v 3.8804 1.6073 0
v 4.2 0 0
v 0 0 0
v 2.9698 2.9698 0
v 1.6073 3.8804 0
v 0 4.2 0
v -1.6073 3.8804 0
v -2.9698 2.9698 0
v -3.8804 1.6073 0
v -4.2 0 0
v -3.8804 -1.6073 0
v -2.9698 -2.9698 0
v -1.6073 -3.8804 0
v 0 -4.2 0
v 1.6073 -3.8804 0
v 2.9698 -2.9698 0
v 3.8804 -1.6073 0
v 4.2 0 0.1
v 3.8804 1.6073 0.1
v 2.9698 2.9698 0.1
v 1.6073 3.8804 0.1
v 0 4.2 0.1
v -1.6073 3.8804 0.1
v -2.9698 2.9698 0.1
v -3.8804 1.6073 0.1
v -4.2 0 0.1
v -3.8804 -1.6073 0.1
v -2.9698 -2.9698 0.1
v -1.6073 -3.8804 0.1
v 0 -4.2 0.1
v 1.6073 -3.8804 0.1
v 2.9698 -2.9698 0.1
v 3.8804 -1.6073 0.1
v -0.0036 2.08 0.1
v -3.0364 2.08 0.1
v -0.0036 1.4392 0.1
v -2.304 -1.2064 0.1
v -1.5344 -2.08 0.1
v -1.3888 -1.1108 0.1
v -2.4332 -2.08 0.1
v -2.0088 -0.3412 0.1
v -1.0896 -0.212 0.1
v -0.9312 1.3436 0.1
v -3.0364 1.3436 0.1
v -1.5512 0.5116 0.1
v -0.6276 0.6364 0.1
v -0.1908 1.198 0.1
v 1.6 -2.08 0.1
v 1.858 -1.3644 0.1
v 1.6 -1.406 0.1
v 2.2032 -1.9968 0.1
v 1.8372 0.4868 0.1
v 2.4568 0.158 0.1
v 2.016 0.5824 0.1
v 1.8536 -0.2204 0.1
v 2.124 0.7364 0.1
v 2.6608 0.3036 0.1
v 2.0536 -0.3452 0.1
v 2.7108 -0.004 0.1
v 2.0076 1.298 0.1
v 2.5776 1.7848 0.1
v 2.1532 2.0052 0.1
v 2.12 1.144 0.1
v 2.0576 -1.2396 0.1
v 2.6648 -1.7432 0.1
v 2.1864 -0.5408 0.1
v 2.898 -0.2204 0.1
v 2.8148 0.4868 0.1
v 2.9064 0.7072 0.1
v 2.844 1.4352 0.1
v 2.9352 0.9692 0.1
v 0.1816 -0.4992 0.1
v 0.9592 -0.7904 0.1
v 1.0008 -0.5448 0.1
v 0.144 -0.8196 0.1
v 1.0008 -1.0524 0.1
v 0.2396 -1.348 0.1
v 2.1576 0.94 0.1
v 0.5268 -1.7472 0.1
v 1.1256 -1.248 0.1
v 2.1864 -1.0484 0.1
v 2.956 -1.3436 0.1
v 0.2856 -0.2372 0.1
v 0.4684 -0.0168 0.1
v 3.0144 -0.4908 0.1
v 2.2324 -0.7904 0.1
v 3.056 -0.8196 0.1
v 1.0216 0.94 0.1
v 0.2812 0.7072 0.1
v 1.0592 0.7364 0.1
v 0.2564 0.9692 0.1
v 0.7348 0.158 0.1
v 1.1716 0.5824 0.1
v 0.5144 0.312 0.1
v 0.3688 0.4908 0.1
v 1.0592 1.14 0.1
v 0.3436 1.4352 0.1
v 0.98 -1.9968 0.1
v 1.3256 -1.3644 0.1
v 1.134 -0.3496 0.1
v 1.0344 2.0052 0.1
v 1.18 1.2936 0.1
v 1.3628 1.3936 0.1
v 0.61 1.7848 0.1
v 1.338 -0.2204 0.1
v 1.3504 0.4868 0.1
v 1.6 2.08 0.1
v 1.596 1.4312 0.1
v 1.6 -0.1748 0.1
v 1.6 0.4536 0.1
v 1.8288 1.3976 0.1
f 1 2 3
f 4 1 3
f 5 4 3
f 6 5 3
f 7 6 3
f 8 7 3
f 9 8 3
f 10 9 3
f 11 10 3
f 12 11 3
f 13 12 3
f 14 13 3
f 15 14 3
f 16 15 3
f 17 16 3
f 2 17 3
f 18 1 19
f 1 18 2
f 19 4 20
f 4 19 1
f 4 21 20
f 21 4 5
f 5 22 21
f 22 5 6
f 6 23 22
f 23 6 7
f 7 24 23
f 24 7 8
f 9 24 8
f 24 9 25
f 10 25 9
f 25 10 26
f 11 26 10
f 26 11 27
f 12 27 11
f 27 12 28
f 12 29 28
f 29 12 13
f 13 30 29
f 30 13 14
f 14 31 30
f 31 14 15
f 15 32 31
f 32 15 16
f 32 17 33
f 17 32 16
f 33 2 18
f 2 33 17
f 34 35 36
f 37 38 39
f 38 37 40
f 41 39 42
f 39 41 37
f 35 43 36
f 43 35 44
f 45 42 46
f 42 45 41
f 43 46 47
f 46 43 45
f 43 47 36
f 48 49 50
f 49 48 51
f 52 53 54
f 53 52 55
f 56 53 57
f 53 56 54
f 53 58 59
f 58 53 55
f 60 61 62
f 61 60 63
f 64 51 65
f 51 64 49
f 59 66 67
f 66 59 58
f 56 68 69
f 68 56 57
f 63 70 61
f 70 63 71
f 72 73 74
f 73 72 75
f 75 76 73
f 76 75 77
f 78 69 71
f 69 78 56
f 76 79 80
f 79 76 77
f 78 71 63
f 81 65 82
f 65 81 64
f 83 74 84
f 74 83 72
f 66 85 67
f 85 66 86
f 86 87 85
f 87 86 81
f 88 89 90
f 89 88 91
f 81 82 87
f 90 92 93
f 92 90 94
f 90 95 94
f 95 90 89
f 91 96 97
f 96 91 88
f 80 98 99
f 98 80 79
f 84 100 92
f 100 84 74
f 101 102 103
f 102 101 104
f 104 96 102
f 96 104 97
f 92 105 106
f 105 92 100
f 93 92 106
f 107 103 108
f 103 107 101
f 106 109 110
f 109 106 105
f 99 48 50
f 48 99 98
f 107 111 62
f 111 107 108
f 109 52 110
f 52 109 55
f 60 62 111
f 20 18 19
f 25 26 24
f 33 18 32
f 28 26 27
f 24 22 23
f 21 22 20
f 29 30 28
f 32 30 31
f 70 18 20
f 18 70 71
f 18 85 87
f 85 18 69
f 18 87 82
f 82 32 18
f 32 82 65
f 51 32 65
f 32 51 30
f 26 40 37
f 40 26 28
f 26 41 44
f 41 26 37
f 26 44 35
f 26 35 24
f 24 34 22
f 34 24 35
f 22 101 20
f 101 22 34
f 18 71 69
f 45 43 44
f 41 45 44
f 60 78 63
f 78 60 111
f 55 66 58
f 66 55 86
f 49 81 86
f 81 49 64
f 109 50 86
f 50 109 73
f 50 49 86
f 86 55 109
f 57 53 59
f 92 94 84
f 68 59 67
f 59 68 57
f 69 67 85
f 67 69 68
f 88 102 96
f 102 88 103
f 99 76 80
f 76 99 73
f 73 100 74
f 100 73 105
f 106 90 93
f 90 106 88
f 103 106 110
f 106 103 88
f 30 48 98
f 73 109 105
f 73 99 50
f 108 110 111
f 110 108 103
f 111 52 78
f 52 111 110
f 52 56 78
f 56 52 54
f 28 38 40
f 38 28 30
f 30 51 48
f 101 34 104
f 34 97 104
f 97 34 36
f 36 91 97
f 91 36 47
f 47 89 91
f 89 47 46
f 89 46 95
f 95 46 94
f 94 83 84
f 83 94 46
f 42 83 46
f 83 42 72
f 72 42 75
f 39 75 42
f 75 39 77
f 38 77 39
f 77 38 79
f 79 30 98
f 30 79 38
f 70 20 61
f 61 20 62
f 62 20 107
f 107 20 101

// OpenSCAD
// file: ../p/4-4disc.scad
use <../lib.scad>
function ldraw_lib__4_4disc() = [
// 0 Disc 1.0
// 0 Name: 4-4disc.dat
// 0 Author: James Jessiman
// 0 !LDRAW_ORG Primitive UPDATE 2002-02
// 0 !LICENSE Licensed under CC BY 4.0 : see CAreadme.txt
// 
// 0 BFC CERTIFY CCW
  [0,"BFC","CERTIFY"],
  [0,"BFC","CCW"],
// 
// 0 !HISTORY 1998-12-15 [PTadmin] Official Update 1998-10
// 0 !HISTORY 2002-03-23 [sbliss] Added BFC statement
// 0 !HISTORY 2002-04-25 [PTadmin] Official Update 2002-02
// 0 !HISTORY 2007-06-24 [PTadmin] Header formatted for Contributor Agreement
// 0 !HISTORY 2008-07-01 [PTadmin] Official Update 2008-01
// 
// 
// 3 16 0 0 0 1 0 0 0.9239 0 0.3827
  [3,16,0,0,0,1,0,0,0.9239,0,0.3827],
// 3 16 0 0 0 0.9239 0 0.3827 0.7071 0 0.7071
  [3,16,0,0,0,0.9239,0,0.3827,0.7071,0,0.7071],
// 3 16 0 0 0 0.7071 0 0.7071 0.3827 0 0.9239
  [3,16,0,0,0,0.7071,0,0.7071,0.3827,0,0.9239],
// 3 16 0 0 0 0.3827 0 0.9239 0 0 1
  [3,16,0,0,0,0.3827,0,0.9239,0,0,1],
// 3 16 0 0 0 0 0 1 -0.3827 0 0.9239
  [3,16,0,0,0,0,0,1,-0.3827,0,0.9239],
// 3 16 0 0 0 -0.3827 0 0.9239 -0.7071 0 0.7071
  [3,16,0,0,0,-0.3827,0,0.9239,-0.7071,0,0.7071],
// 3 16 0 0 0 -0.7071 0 0.7071 -0.9239 0 0.3827
  [3,16,0,0,0,-0.7071,0,0.7071,-0.9239,0,0.3827],
// 3 16 0 0 0 -0.9239 0 0.3827 -1 0 -0
  [3,16,0,0,0,-0.9239,0,0.3827,-1,0,-0],
// 3 16 0 0 0 -1 0 -0 -0.9239 0 -0.3827
  [3,16,0,0,0,-1,0,-0,-0.9239,0,-0.3827],
// 3 16 0 0 0 -0.9239 0 -0.3827 -0.7071 0 -0.7071
  [3,16,0,0,0,-0.9239,0,-0.3827,-0.7071,0,-0.7071],
// 3 16 0 0 0 -0.7071 0 -0.7071 -0.3827 0 -0.9239
  [3,16,0,0,0,-0.7071,0,-0.7071,-0.3827,0,-0.9239],
// 3 16 0 0 0 -0.3827 0 -0.9239 0 0 -1
  [3,16,0,0,0,-0.3827,0,-0.9239,0,0,-1],
// 3 16 0 0 0 0 0 -1 0.3827 0 -0.9239
  [3,16,0,0,0,0,0,-1,0.3827,0,-0.9239],
// 3 16 0 0 0 0.3827 0 -0.9239 0.7071 0 -0.7071
  [3,16,0,0,0,0.3827,0,-0.9239,0.7071,0,-0.7071],
// 3 16 0 0 0 0.7071 0 -0.7071 0.9239 0 -0.3827
  [3,16,0,0,0,0.7071,0,-0.7071,0.9239,0,-0.3827],
// 3 16 0 0 0 0.9239 0 -0.3827 1 0 0
  [3,16,0,0,0,0.9239,0,-0.3827,1,0,0],
// 0
];
module ldraw_lib__4_4disc(step=0, col=false, unit=2/5, alt=false, line=0.2, solid=!$preview)
    makepoly(ldraw_lib__4_4disc(), step=step, col=col, unit=unit, alt=alt, line=line, solid=solid);
ldraw_lib__4_4disc(line=0.2);
// file: ../p/4-4cyli.scad
use <../lib.scad>
function ldraw_lib__4_4cyli() = [
// 0 Cylinder 1.0
// 0 Name: 4-4cyli.dat
// 0 Author: James Jessiman
// 0 !LDRAW_ORG Primitive UPDATE 2005-01
// 0 !LICENSE Licensed under CC BY 4.0 : see CAreadme.txt
// 
// 0 BFC CERTIFY CCW
  [0,"BFC","CERTIFY"],
  [0,"BFC","CCW"],
// 
// 0 !HISTORY 1998-12-15 [PTadmin] Official Update 1998-10
// 0 !HISTORY 2002-03-23 [sbliss] Added BFC statement; merged headers from files in distributions LDraw 0.27 and Complete.
// 0 !HISTORY 2002-04-25 [PTadmin] Official Update 2002-02
// 0 !HISTORY 2004-12-14 [guyvivan] BFC CCW
// 0 !HISTORY 2005-12-28 [PTadmin] Official Update 2005-01
// 0 !HISTORY 2007-06-24 [PTadmin] Header formatted for Contributor Agreement
// 0 !HISTORY 2008-07-01 [PTadmin] Official Update 2008-01
// 
// 
// 4 16 1 1 0 0.9239 1 0.3827 0.9239 0 0.3827 1 0 0
  [4,16,1,1,0,0.9239,1,0.3827,0.9239,0,0.3827,1,0,0],
// 5 24 1 0 0 1 1 0 0.9239 0 0.3827 0.9239 0 -0.3827
  [5,24,1,0,0,1,1,0,0.9239,0,0.3827,0.9239,0,-0.3827],
// 4 16 0.9239 1 0.3827 0.7071 1 0.7071 0.7071 0 0.7071 0.9239 0 0.3827
  [4,16,0.9239,1,0.3827,0.7071,1,0.7071,0.7071,0,0.7071,0.9239,0,0.3827],
// 5 24 0.9239 0 0.3827 0.9239 1 0.3827 0.7071 0 0.7071 1 0 0
  [5,24,0.9239,0,0.3827,0.9239,1,0.3827,0.7071,0,0.7071,1,0,0],
// 4 16 0.7071 1 0.7071 0.3827 1 0.9239 0.3827 0 0.9239 0.7071 0 0.7071
  [4,16,0.7071,1,0.7071,0.3827,1,0.9239,0.3827,0,0.9239,0.7071,0,0.7071],
// 5 24 0.7071 0 0.7071 0.7071 1 0.7071 0.3827 0 0.9239 0.9239 0 0.3827
  [5,24,0.7071,0,0.7071,0.7071,1,0.7071,0.3827,0,0.9239,0.9239,0,0.3827],
// 4 16 0.3827 1 0.9239 0 1 1 0 0 1 0.3827 0 0.9239
  [4,16,0.3827,1,0.9239,0,1,1,0,0,1,0.3827,0,0.9239],
// 5 24 0.3827 0 0.9239 0.3827 1 0.9239 0 0 1 0.7071 0 0.7071
  [5,24,0.3827,0,0.9239,0.3827,1,0.9239,0,0,1,0.7071,0,0.7071],
// 4 16 0 1 1 -0.3827 1 0.9239 -0.3827 0 0.9239 0 0 1
  [4,16,0,1,1,-0.3827,1,0.9239,-0.3827,0,0.9239,0,0,1],
// 5 24 0 0 1 0 1 1 -0.3827 0 0.9239 0.3827 0 0.9239
  [5,24,0,0,1,0,1,1,-0.3827,0,0.9239,0.3827,0,0.9239],
// 4 16 -0.3827 1 0.9239 -0.7071 1 0.7071 -0.7071 0 0.7071 -0.3827 0 0.9239
  [4,16,-0.3827,1,0.9239,-0.7071,1,0.7071,-0.7071,0,0.7071,-0.3827,0,0.9239],
// 5 24 -0.3827 0 0.9239 -0.3827 1 0.9239 -0.7071 0 0.7071 0 0 1
  [5,24,-0.3827,0,0.9239,-0.3827,1,0.9239,-0.7071,0,0.7071,0,0,1],
// 4 16 -0.7071 1 0.7071 -0.9239 1 0.3827 -0.9239 0 0.3827 -0.7071 0 0.7071
  [4,16,-0.7071,1,0.7071,-0.9239,1,0.3827,-0.9239,0,0.3827,-0.7071,0,0.7071],
// 5 24 -0.7071 0 0.7071 -0.7071 1 0.7071 -0.9239 0 0.3827 -0.3827 0 0.9239
  [5,24,-0.7071,0,0.7071,-0.7071,1,0.7071,-0.9239,0,0.3827,-0.3827,0,0.9239],
// 4 16 -0.9239 1 0.3827 -1 1 0 -1 0 0 -0.9239 0 0.3827
  [4,16,-0.9239,1,0.3827,-1,1,0,-1,0,0,-0.9239,0,0.3827],
// 5 24 -0.9239 0 0.3827 -0.9239 1 0.3827 -1 0 0 -0.7071 0 0.7071
  [5,24,-0.9239,0,0.3827,-0.9239,1,0.3827,-1,0,0,-0.7071,0,0.7071],
// 4 16 -1 1 0 -0.9239 1 -0.3827 -0.9239 0 -0.3827 -1 0 0
  [4,16,-1,1,0,-0.9239,1,-0.3827,-0.9239,0,-0.3827,-1,0,0],
// 5 24 -1 0 0 -1 1 0 -0.9239 0 -0.3827 -0.9239 0 0.3827
  [5,24,-1,0,0,-1,1,0,-0.9239,0,-0.3827,-0.9239,0,0.3827],
// 4 16 -0.9239 1 -0.3827 -0.7071 1 -0.7071 -0.7071 0 -0.7071 -0.9239 0 -0.3827
  [4,16,-0.9239,1,-0.3827,-0.7071,1,-0.7071,-0.7071,0,-0.7071,-0.9239,0,-0.3827],
// 5 24 -0.9239 0 -0.3827 -0.9239 1 -0.3827 -0.7071 0 -0.7071 -1 0 0
  [5,24,-0.9239,0,-0.3827,-0.9239,1,-0.3827,-0.7071,0,-0.7071,-1,0,0],
// 4 16 -0.7071 1 -0.7071 -0.3827 1 -0.9239 -0.3827 0 -0.9239 -0.7071 0 -0.7071
  [4,16,-0.7071,1,-0.7071,-0.3827,1,-0.9239,-0.3827,0,-0.9239,-0.7071,0,-0.7071],
// 5 24 -0.7071 0 -0.7071 -0.7071 1 -0.7071 -0.3827 0 -0.9239 -0.9239 0 -0.3827
  [5,24,-0.7071,0,-0.7071,-0.7071,1,-0.7071,-0.3827,0,-0.9239,-0.9239,0,-0.3827],
// 4 16 -0.3827 1 -0.9239 0 1 -1 0 0 -1 -0.3827 0 -0.9239
  [4,16,-0.3827,1,-0.9239,0,1,-1,0,0,-1,-0.3827,0,-0.9239],
// 5 24 -0.3827 0 -0.9239 -0.3827 1 -0.9239 0 0 -1 -0.7071 0 -0.7071
  [5,24,-0.3827,0,-0.9239,-0.3827,1,-0.9239,0,0,-1,-0.7071,0,-0.7071],
// 4 16 0 1 -1 0.3827 1 -0.9239 0.3827 0 -0.9239 0 0 -1
  [4,16,0,1,-1,0.3827,1,-0.9239,0.3827,0,-0.9239,0,0,-1],
// 5 24 0 0 -1 0 1 -1 0.3827 0 -0.9239 -0.3827 0 -0.9239
  [5,24,0,0,-1,0,1,-1,0.3827,0,-0.9239,-0.3827,0,-0.9239],
// 4 16 0.3827 1 -0.9239 0.7071 1 -0.7071 0.7071 0 -0.7071 0.3827 0 -0.9239
  [4,16,0.3827,1,-0.9239,0.7071,1,-0.7071,0.7071,0,-0.7071,0.3827,0,-0.9239],
// 5 24 0.3827 0 -0.9239 0.3827 1 -0.9239 0.7071 0 -0.7071 0 0 -1
  [5,24,0.3827,0,-0.9239,0.3827,1,-0.9239,0.7071,0,-0.7071,0,0,-1],
// 4 16 0.7071 1 -0.7071 0.9239 1 -0.3827 0.9239 0 -0.3827 0.7071 0 -0.7071
  [4,16,0.7071,1,-0.7071,0.9239,1,-0.3827,0.9239,0,-0.3827,0.7071,0,-0.7071],
// 5 24 0.7071 0 -0.7071 0.7071 1 -0.7071 0.9239 0 -0.3827 0.3827 0 -0.9239
  [5,24,0.7071,0,-0.7071,0.7071,1,-0.7071,0.9239,0,-0.3827,0.3827,0,-0.9239],
// 4 16 0.9239 1 -0.3827 1 1 0 1 0 0 0.9239 0 -0.3827
  [4,16,0.9239,1,-0.3827,1,1,0,1,0,0,0.9239,0,-0.3827],
// 5 24 0.9239 0 -0.3827 0.9239 1 -0.3827 1 0 0 0.7071 0 -0.7071
  [5,24,0.9239,0,-0.3827,0.9239,1,-0.3827,1,0,0,0.7071,0,-0.7071],
// 0
];
module ldraw_lib__4_4cyli(step=0, col=false, unit=2/5, alt=false, line=0.2, solid=!$preview)
    makepoly(ldraw_lib__4_4cyli(), step=step, col=col, unit=unit, alt=alt, line=line, solid=solid);
ldraw_lib__4_4cyli(line=0.2);
// file: ../p/4-4cylc3.scad
use <../lib.scad>
use <4-4cyli.scad>
use <4-4disc.scad>
function ldraw_lib__4_4cylc3() = [
// 0 Cylinder Closed 1.0 without Top or Bottom Edge Lines
// 0 Name: 4-4cylc3.dat
// 0 Author: Chris Dee [cwdee]
// 0 !LDRAW_ORG Primitive UPDATE 2017-01
// 0 !LICENSE Licensed under CC BY 4.0 : see CAreadme.txt
// 
// 0 BFC CERTIFY CCW
  [0,"BFC","CERTIFY"],
  [0,"BFC","CCW"],
// 
// 0 !HISTORY 2017-12-30 [PTadmin] Official Update 2017-01
// 
// 
// 1 16 0 0 0 1 0 0 0 1 0 0 0 1 4-4disc.dat
  [1,16,0,0,0,1,0,0,0,1,0,0,0,1, ldraw_lib__4_4disc()],
// 1 16 0 0 0 1 0 0 0 1 0 0 0 1 4-4cyli.dat
  [1,16,0,0,0,1,0,0,0,1,0,0,0,1, ldraw_lib__4_4cyli()],
// 0
];
module ldraw_lib__4_4cylc3(step=0, col=false, unit=2/5, alt=false, line=0.2, solid=!$preview)
    makepoly(ldraw_lib__4_4cylc3(), step=step, col=col, unit=unit, alt=alt, line=line, solid=solid);
ldraw_lib__4_4cylc3(line=0.2);
// file: ../p/1-8chrd.scad
use <../lib.scad>
function ldraw_lib__1_8chrd() = [
// 0 Chord 0.125
// 0 Name: 1-8chrd.dat
// 0 Author: Orion Pobursky [OrionP]
// 0 !LDRAW_ORG Primitive UPDATE 2023-05
// 0 !LICENSE Licensed under CC BY 4.0 : see CAreadme.txt
// 
// 0 BFC CERTIFY CCW
  [0,"BFC","CERTIFY"],
  [0,"BFC","CCW"],
// 
// 0 !HISTORY 2004-04-22 [PTadmin] Official Update 2004-02
// 0 !HISTORY 2007-06-22 [PTadmin] Header formatted for Contributor Agreement
// 0 !HISTORY 2008-07-01 [PTadmin] Official Update 2008-01
// 0 !HISTORY 2023-10-27 [OrionP] Rebuilt with PrimGen2, original author westrate
// 0 !HISTORY 2023-10-31 [OrionP] Official Update 2023-05
// 
// 3 16 1 0 0 0.9239 0 0.3827 0.7071 0 0.7071
  [3,16,1,0,0,0.9239,0,0.3827,0.7071,0,0.7071],
];
module ldraw_lib__1_8chrd(step=0, col=false, unit=2/5, alt=false, line=0.2, solid=!$preview)
    makepoly(ldraw_lib__1_8chrd(), step=step, col=col, unit=unit, alt=alt, line=line, solid=solid);
ldraw_lib__1_8chrd(line=0.2);
// main file
use <../lib.scad>
use <../p/1-8chrd.scad>
use <../p/4-4cylc3.scad>
function ldraw_lib__003667d() = [
// 0 Sticker  1.0 x  1.0 Round with White "78" on Black Background
// 0 Name: 003667d.dat
// 0 Author: Willy Tschager [Holly-Wood]
// 0 !LDRAW_ORG Part UPDATE 2024-01
// 0 !LICENSE Licensed under CC BY 4.0 : see CAreadme.txt
// 
// 0 BFC CERTIFY CCW
  [0,"BFC","CERTIFY"],
  [0,"BFC","CCW"],
// 
// 0 !KEYWORDS Bricklink 619stk01, Brickowl 853878, Car, legoland, Race
// 0 !KEYWORDS Rebrickable 3667, set 619, town
// 
// 0 !HISTORY 2024-01-29 [OrionP] Official Update 2024-01
// 
// 0 // Small cylinder
// 1 16 0 0 0 10.5 0 0 0 -.25 0 0 0 10.5 4-4cylc3.dat
  [1,16,0,0,0,10.5,0,0,0,-.25,0,0,0,10.5, ldraw_lib__4_4cylc3()],
// 
// 0 // 7
// 0 // White
// 3 15 -.009 -.25 5.2 -7.591 -.25 5.2 -.009 -.25 3.598
  [3,15,-.009,-.25,5.2,-7.591,-.25,5.2,-.009,-.25,3.598],
// 4 15 -6.083 -.25 -5.2 -3.836 -.25 -5.2 -3.472 -.25 -2.777 -5.76 -.25 -3.016
  [4,15,-6.083,-.25,-5.2,-3.836,-.25,-5.2,-3.472,-.25,-2.777,-5.76,-.25,-3.016],
// 4 15 -2.724 -.25 -.53 -5.022 -.25 -.853 -5.76 -.25 -3.016 -3.472 -.25 -2.777
  [4,15,-2.724,-.25,-.53,-5.022,-.25,-.853,-5.76,-.25,-3.016,-3.472,-.25,-2.777],
// 4 15 -.009 -.25 3.598 -7.591 -.25 5.2 -7.591 -.25 3.359 -2.328 -.25 3.359
  [4,15,-.009,-.25,3.598,-7.591,-.25,5.2,-7.591,-.25,3.359,-2.328,-.25,3.359],
// 4 15 -5.022 -.25 -.853 -2.724 -.25 -.53 -1.569 -.25 1.591 -3.878 -.25 1.279
  [4,15,-5.022,-.25,-.853,-2.724,-.25,-.53,-1.569,-.25,1.591,-3.878,-.25,1.279],
// 4 15 -.477 -.25 2.995 -2.328 -.25 3.359 -3.878 -.25 1.279 -1.569 -.25 1.591
  [4,15,-.477,-.25,2.995,-2.328,-.25,3.359,-3.878,-.25,1.279,-1.569,-.25,1.591],
// 3 15 -2.328 -.25 3.359 -.477 -.25 2.995 -.009 -.25 3.598
  [3,15,-2.328,-.25,3.359,-.477,-.25,2.995,-.009,-.25,3.598],
// 
// 0 // 8
// 0 // White
// 4 15 4 -.25 -3.515 4 -.25 -5.2 5.508 -.25 -4.992 4.645 -.25 -3.411
  [4,15,4,-.25,-3.515,4,-.25,-5.2,5.508,-.25,-4.992,4.645,-.25,-3.411],
// 4 15 5.04 -.25 1.456 4.593 -.25 1.217 4.634 -.25 -.551 6.142 -.25 .395
  [4,15,5.04,-.25,1.456,4.593,-.25,1.217,4.634,-.25,-.551,6.142,-.25,.395],
// 4 15 6.652 -.25 .759 5.31 -.25 1.841 5.04 -.25 1.456 6.142 -.25 .395
  [4,15,6.652,-.25,.759,5.31,-.25,1.841,5.04,-.25,1.456,6.142,-.25,.395],
// 4 15 6.777 -.25 -.01 6.142 -.25 .395 4.634 -.25 -.551 5.134 -.25 -.863
  [4,15,6.777,-.25,-.01,6.142,-.25,.395,4.634,-.25,-.551,5.134,-.25,-.863],
// 4 15 5.383 -.25 5.013 5.019 -.25 3.245 5.3 -.25 2.86 6.444 -.25 4.462
  [4,15,5.383,-.25,5.013,5.019,-.25,3.245,5.3,-.25,2.86,6.444,-.25,4.462],
// 4 15 4.645 -.25 -3.411 5.508 -.25 -4.992 6.662 -.25 -4.358 5.144 -.25 -3.099
  [4,15,4.645,-.25,-3.411,5.508,-.25,-4.992,6.662,-.25,-4.358,5.144,-.25,-3.099],
// 4 15 7.245 -.25 -.551 6.777 -.25 -.01 5.134 -.25 -.863 5.466 -.25 -1.352
  [4,15,7.245,-.25,-.551,6.777,-.25,-.01,5.134,-.25,-.863,5.466,-.25,-1.352],
// 4 15 7.266 -.25 1.768 5.31 -.25 1.841 6.652 -.25 .759 7.037 -.25 1.217
  [4,15,7.266,-.25,1.768,5.31,-.25,1.841,6.652,-.25,.759,7.037,-.25,1.217],
// 4 15 7.338 -.25 2.423 7.11 -.25 3.588 6.444 -.25 4.462 5.3 -.25 2.86
  [4,15,7.338,-.25,2.423,7.11,-.25,3.588,6.444,-.25,4.462,5.3,-.25,2.86],
// 4 15 2.502 -.25 -1.362 .454 -.25 -1.248 .36 -.25 -2.049 2.398 -.25 -1.976
  [4,15,2.502,-.25,-1.362,.454,-.25,-1.248,.36,-.25,-2.049,2.398,-.25,-1.976],
// 4 15 2.398 -.25 -1.976 .36 -.25 -2.049 .599 -.25 -3.37 2.502 -.25 -2.631
  [4,15,2.398,-.25,-1.976,.36,-.25,-2.049,.599,-.25,-3.37,2.502,-.25,-2.631],
// 4 15 5.31 -.25 1.841 7.266 -.25 1.768 7.338 -.25 2.423 5.394 -.25 2.35
  [4,15,5.31,-.25,1.841,7.266,-.25,1.768,7.338,-.25,2.423,5.394,-.25,2.35],
// 4 15 2.814 -.25 -3.12 2.502 -.25 -2.631 .599 -.25 -3.37 1.317 -.25 -4.368
  [4,15,2.814,-.25,-3.12,2.502,-.25,-2.631,.599,-.25,-3.37,1.317,-.25,-4.368],
// 3 15 5.394 -.25 2.35 7.338 -.25 2.423 5.3 -.25 2.86
  [3,15,5.394,-.25,2.35,7.338,-.25,2.423,5.3,-.25,2.86],
// 4 15 5.144 -.25 -3.099 6.662 -.25 -4.358 7.39 -.25 -3.359 5.466 -.25 -2.621
  [4,15,5.144,-.25,-3.099,6.662,-.25,-4.358,7.39,-.25,-3.359,5.466,-.25,-2.621],
// 4 15 1.171 -.25 -.042 .714 -.25 -.593 .454 -.25 -1.248 2.502 -.25 -1.362
  [4,15,1.171,-.25,-.042,.714,-.25,-.593,.454,-.25,-1.248,2.502,-.25,-1.362],
// 4 15 7.245 -.25 -.551 5.466 -.25 -1.352 5.581 -.25 -1.976 7.536 -.25 -1.227
  [4,15,7.245,-.25,-.551,5.466,-.25,-1.352,5.581,-.25,-1.976,7.536,-.25,-1.227],
// 4 15 5.466 -.25 -2.621 7.64 -.25 -2.049 7.536 -.25 -1.227 5.581 -.25 -1.976
  [4,15,5.466,-.25,-2.621,7.64,-.25,-2.049,7.536,-.25,-1.227,5.581,-.25,-1.976],
// 4 15 .641 -.25 2.423 .703 -.25 1.768 2.648 -.25 1.841 2.554 -.25 2.35
  [4,15,.641,-.25,2.423,.703,-.25,1.768,2.648,-.25,1.841,2.554,-.25,2.35],
// 3 15 5.466 -.25 -2.621 7.39 -.25 -3.359 7.64 -.25 -2.049
  [3,15,5.466,-.25,-2.621,7.39,-.25,-3.359,7.64,-.25,-2.049],
// 4 15 2.929 -.25 1.456 2.648 -.25 1.841 1.286 -.25 .78 1.837 -.25 .395
  [4,15,2.929,-.25,1.456,2.648,-.25,1.841,1.286,-.25,.78,1.837,-.25,.395],
// 4 15 1.286 -.25 .78 2.648 -.25 1.841 .703 -.25 1.768 .922 -.25 1.227
  [4,15,1.286,-.25,.78,2.648,-.25,1.841,.703,-.25,1.768,.922,-.25,1.227],
// 4 15 .859 -.25 3.588 .641 -.25 2.423 2.554 -.25 2.35 2.648 -.25 2.85
  [4,15,.859,-.25,3.588,.641,-.25,2.423,2.554,-.25,2.35,2.648,-.25,2.85],
// 4 15 3.314 -.25 -3.411 2.814 -.25 -3.12 1.317 -.25 -4.368 2.45 -.25 -4.992
  [4,15,3.314,-.25,-3.411,2.814,-.25,-3.12,1.317,-.25,-4.368,2.45,-.25,-4.992],
// 4 15 2.502 -.25 -1.362 2.835 -.25 -.874 1.837 -.25 .395 1.171 -.25 -.042
  [4,15,2.502,-.25,-1.362,2.835,-.25,-.874,1.837,-.25,.395,1.171,-.25,-.042],
// 4 15 3.407 -.25 3.484 2.586 -.25 5.013 1.525 -.25 4.462 2.95 -.25 3.234
  [4,15,3.407,-.25,3.484,2.586,-.25,5.013,1.525,-.25,4.462,2.95,-.25,3.234],
// 4 15 .859 -.25 3.588 2.648 -.25 2.85 2.95 -.25 3.234 1.525 -.25 4.462
  [4,15,.859,-.25,3.588,2.648,-.25,2.85,2.95,-.25,3.234,1.525,-.25,4.462],
// 4 15 2.835 -.25 -.874 3.345 -.25 -.551 3.376 -.25 1.217 1.837 -.25 .395
  [4,15,2.835,-.25,-.874,3.345,-.25,-.551,3.376,-.25,1.217,1.837,-.25,.395],
// 3 15 2.929 -.25 1.456 1.837 -.25 .395 3.376 -.25 1.217
  [3,15,2.929,-.25,1.456,1.837,-.25,.395,3.376,-.25,1.217],
// 4 15 3.99 -.25 3.578 4 -.25 5.2 2.586 -.25 5.013 3.407 -.25 3.484
  [4,15,3.99,-.25,3.578,4,-.25,5.2,2.586,-.25,5.013,3.407,-.25,3.484],
// 4 15 3.345 -.25 -.551 4 -.25 -.437 4 -.25 1.134 3.376 -.25 1.217
  [4,15,3.345,-.25,-.551,4,-.25,-.437,4,-.25,1.134,3.376,-.25,1.217],
// 4 15 2.45 -.25 -4.992 4 -.25 -5.2 4 -.25 -3.515 3.314 -.25 -3.411
  [4,15,2.45,-.25,-4.992,4,-.25,-5.2,4,-.25,-3.515,3.314,-.25,-3.411],
// 4 15 5.383 -.25 5.013 4 -.25 5.2 3.99 -.25 3.578 4.572 -.25 3.494
  [4,15,5.383,-.25,5.013,4,-.25,5.2,3.99,-.25,3.578,4.572,-.25,3.494],
// 4 15 4 -.25 1.134 4 -.25 -.437 4.634 -.25 -.551 4.593 -.25 1.217
  [4,15,4,-.25,1.134,4,-.25,-.437,4.634,-.25,-.551,4.593,-.25,1.217],
// 3 15 5.019 -.25 3.245 5.383 -.25 5.013 4.572 -.25 3.494
  [3,15,5.019,-.25,3.245,5.383,-.25,5.013,4.572,-.25,3.494],
// 
// 0 // Black
// 1 0 0 -.25 0 10.5 0 0 0 1 0 0 0 10.5 1-8chrd.dat
  [1,0,0,-.25,0,10.5,0,0,0,1,0,0,0,10.5, ldraw_lib__1_8chrd()],
// 1 0 0 -.25 0 -10.5 0 0 0 1 0 0 0 10.5 1-8chrd.dat
  [1,0,0,-.25,0,-10.5,0,0,0,1,0,0,0,10.5, ldraw_lib__1_8chrd()],
// 1 0 0 -.25 0 10.5 0 0 0 1 0 0 0 -10.5 1-8chrd.dat
  [1,0,0,-.25,0,10.5,0,0,0,1,0,0,0,-10.5, ldraw_lib__1_8chrd()],
// 1 0 0 -.25 0 -10.5 0 0 0 1 0 0 0 -10.5 1-8chrd.dat
  [1,0,0,-.25,0,-10.5,0,0,0,1,0,0,0,-10.5, ldraw_lib__1_8chrd()],
// 1 0 0 -.25 0 0 0 -10.5 0 1 0 10.5 0 0 1-8chrd.dat
  [1,0,0,-.25,0,0,0,-10.5,0,1,0,10.5,0,0, ldraw_lib__1_8chrd()],
// 1 0 0 -.25 0 0 0 10.5 0 1 0 10.5 0 0 1-8chrd.dat
  [1,0,0,-.25,0,0,0,10.5,0,1,0,10.5,0,0, ldraw_lib__1_8chrd()],
// 1 0 0 -.25 0 0 0 -10.5 0 1 0 -10.5 0 0 1-8chrd.dat
  [1,0,0,-.25,0,0,0,-10.5,0,1,0,-10.5,0,0, ldraw_lib__1_8chrd()],
// 1 0 0 -.25 0 0 0 10.5 0 1 0 -10.5 0 0 1-8chrd.dat
  [1,0,0,-.25,0,0,0,10.5,0,1,0,-10.5,0,0, ldraw_lib__1_8chrd()],
// 
// 4 0 10.5 -.25 0 7.42455 -.25 7.42455 7.11 -.25 3.588 7.338 -.25 2.423
  [4,0,10.5,-.25,0,7.42455,-.25,7.42455,7.11,-.25,3.588,7.338,-.25,2.423],
// 4 0 7.64 -.25 -2.049 10.5 -.25 0 7.266 -.25 1.768 7.536 -.25 -1.227
  [4,0,7.64,-.25,-2.049,10.5,-.25,0,7.266,-.25,1.768,7.536,-.25,-1.227],
// 3 0 10.5 -.25 0 7.64 -.25 -2.049 7.39 -.25 -3.359
  [3,0,10.5,-.25,0,7.64,-.25,-2.049,7.39,-.25,-3.359],
// 4 0 10.5 -.25 0 7.39 -.25 -3.359 6.662 -.25 -4.358 7.42455 -.25 -7.42455
  [4,0,10.5,-.25,0,7.39,-.25,-3.359,6.662,-.25,-4.358,7.42455,-.25,-7.42455],
// 4 0 6.662 -.25 -4.358 5.508 -.25 -4.992 0 -.25 -10.5 7.42455 -.25 -7.42455
  [4,0,6.662,-.25,-4.358,5.508,-.25,-4.992,0,-.25,-10.5,7.42455,-.25,-7.42455],
// 4 0 -7.42455 -.25 -7.42455 -6.083 -.25 -5.2 -5.76 -.25 -3.016 -10.5 -.25 0
  [4,0,-7.42455,-.25,-7.42455,-6.083,-.25,-5.2,-5.76,-.25,-3.016,-10.5,-.25,0],
// 4 0 -7.591 -.25 3.359 -10.5 -.25 0 -5.76 -.25 -3.016 -5.022 -.25 -.853
  [4,0,-7.591,-.25,3.359,-10.5,-.25,0,-5.76,-.25,-3.016,-5.022,-.25,-.853],
// 3 0 -10.5 -.25 0 -7.591 -.25 3.359 -7.591 -.25 5.2
  [3,0,-10.5,-.25,0,-7.591,-.25,3.359,-7.591,-.25,5.2],
// 3 0 -10.5 -.25 0 -7.591 -.25 5.2 -7.42455 -.25 7.42455
  [3,0,-10.5,-.25,0,-7.591,-.25,5.2,-7.42455,-.25,7.42455],
// 4 0 0 -.25 10.5 -7.42455 -.25 7.42455 -7.591 -.25 5.2 -.009 -.25 5.2
  [4,0,0,-.25,10.5,-7.42455,-.25,7.42455,-7.591,-.25,5.2,-.009,-.25,5.2],
// 4 0 -.009 -.25 5.2 2.586 -.25 5.013 7.42455 -.25 7.42455 0 -.25 10.5
  [4,0,-.009,-.25,5.2,2.586,-.25,5.013,7.42455,-.25,7.42455,0,-.25,10.5],
// 3 0 10.5 -.25 0 7.338 -.25 2.423 7.266 -.25 1.768
  [3,0,10.5,-.25,0,7.338,-.25,2.423,7.266,-.25,1.768],
// 3 0 -3.878 -.25 1.279 -2.328 -.25 3.359 -7.591 -.25 3.359
  [3,0,-3.878,-.25,1.279,-2.328,-.25,3.359,-7.591,-.25,3.359],
// 3 0 -5.022 -.25 -.853 -3.878 -.25 1.279 -7.591 -.25 3.359
  [3,0,-5.022,-.25,-.853,-3.878,-.25,1.279,-7.591,-.25,3.359],
// 4 0 5.019 -.25 3.245 4.572 -.25 3.494 5.394 -.25 2.35 5.3 -.25 2.86
  [4,0,5.019,-.25,3.245,4.572,-.25,3.494,5.394,-.25,2.35,5.3,-.25,2.86],
// 4 0 5.581 -.25 -1.976 5.466 -.25 -1.352 5.134 -.25 -.863 4.634 -.25 -.551
  [4,0,5.581,-.25,-1.976,5.466,-.25,-1.352,5.134,-.25,-.863,4.634,-.25,-.551],
// 4 0 5.581 -.25 -1.976 4.645 -.25 -3.411 5.144 -.25 -3.099 5.466 -.25 -2.621
  [4,0,5.581,-.25,-1.976,4.645,-.25,-3.411,5.144,-.25,-3.099,5.466,-.25,-2.621],
// 4 0 2.398 -.25 -1.976 4 -.25 -3.515 5.581 -.25 -1.976 4 -.25 -.437
  [4,0,2.398,-.25,-1.976,4,-.25,-3.515,5.581,-.25,-1.976,4,-.25,-.437],
// 3 0 4 -.25 -3.515 4.645 -.25 -3.411 5.581 -.25 -1.976
  [3,0,4,-.25,-3.515,4.645,-.25,-3.411,5.581,-.25,-1.976],
// 3 0 5.581 -.25 -1.976 4.634 -.25 -.551 4 -.25 -.437
  [3,0,5.581,-.25,-1.976,4.634,-.25,-.551,4,-.25,-.437],
// 3 0 6.652 -.25 .759 6.142 -.25 .395 6.777 -.25 -.01
  [3,0,6.652,-.25,.759,6.142,-.25,.395,6.777,-.25,-.01],
// 3 0 1.837 -.25 .395 1.286 -.25 .78 1.171 -.25 -.042
  [3,0,1.837,-.25,.395,1.286,-.25,.78,1.171,-.25,-.042],
// 4 0 6.652 -.25 .759 6.777 -.25 -.01 7.245 -.25 -.551 7.037 -.25 1.217
  [4,0,6.652,-.25,.759,6.777,-.25,-.01,7.245,-.25,-.551,7.037,-.25,1.217],
// 4 0 7.037 -.25 1.217 7.245 -.25 -.551 7.536 -.25 -1.227 7.266 -.25 1.768
  [4,0,7.037,-.25,1.217,7.245,-.25,-.551,7.536,-.25,-1.227,7.266,-.25,1.768],
// 4 0 3.407 -.25 3.484 2.95 -.25 3.234 2.648 -.25 2.85 2.554 -.25 2.35
  [4,0,3.407,-.25,3.484,2.95,-.25,3.234,2.648,-.25,2.85,2.554,-.25,2.35],
// 4 0 2.814 -.25 -3.12 3.314 -.25 -3.411 2.398 -.25 -1.976 2.502 -.25 -2.631
  [4,0,2.814,-.25,-3.12,3.314,-.25,-3.411,2.398,-.25,-1.976,2.502,-.25,-2.631],
// 4 0 2.835 -.25 -.874 2.502 -.25 -1.362 2.398 -.25 -1.976 3.345 -.25 -.551
  [4,0,2.835,-.25,-.874,2.502,-.25,-1.362,2.398,-.25,-1.976,3.345,-.25,-.551],
// 4 0 2.929 -.25 1.456 3.376 -.25 1.217 2.554 -.25 2.35 2.648 -.25 1.841
  [4,0,2.929,-.25,1.456,3.376,-.25,1.217,2.554,-.25,2.35,2.648,-.25,1.841],
// 4 0 4 -.25 1.134 3.407 -.25 3.484 2.554 -.25 2.35 3.376 -.25 1.217
  [4,0,4,-.25,1.134,3.407,-.25,3.484,2.554,-.25,2.35,3.376,-.25,1.217],
// 3 0 0 -.25 -10.5 4 -.25 -5.2 2.45 -.25 -4.992
  [3,0,0,-.25,-10.5,4,-.25,-5.2,2.45,-.25,-4.992],
// 3 0 2.398 -.25 -1.976 4 -.25 -.437 3.345 -.25 -.551
  [3,0,2.398,-.25,-1.976,4,-.25,-.437,3.345,-.25,-.551],
// 3 0 2.398 -.25 -1.976 3.314 -.25 -3.411 4 -.25 -3.515
  [3,0,2.398,-.25,-1.976,3.314,-.25,-3.411,4,-.25,-3.515],
// 4 0 3.407 -.25 3.484 4 -.25 1.134 4.572 -.25 3.494 3.99 -.25 3.578
  [4,0,3.407,-.25,3.484,4,-.25,1.134,4.572,-.25,3.494,3.99,-.25,3.578],
// 4 0 4 -.25 1.134 4.593 -.25 1.217 5.394 -.25 2.35 4.572 -.25 3.494
  [4,0,4,-.25,1.134,4.593,-.25,1.217,5.394,-.25,2.35,4.572,-.25,3.494],
// 4 0 5.04 -.25 1.456 5.31 -.25 1.841 5.394 -.25 2.35 4.593 -.25 1.217
  [4,0,5.04,-.25,1.456,5.31,-.25,1.841,5.394,-.25,2.35,4.593,-.25,1.217],
// 4 0 -7.42455 -.25 -7.42455 0 -.25 -10.5 -3.836 -.25 -5.2 -6.083 -.25 -5.2
  [4,0,-7.42455,-.25,-7.42455,0,-.25,-10.5,-3.836,-.25,-5.2,-6.083,-.25,-5.2],
// 3 0 0 -.25 -10.5 5.508 -.25 -4.992 4 -.25 -5.2
  [3,0,0,-.25,-10.5,5.508,-.25,-4.992,4,-.25,-5.2],
// 3 0 2.586 -.25 5.013 -.009 -.25 5.2 1.525 -.25 4.462
  [3,0,2.586,-.25,5.013,-.009,-.25,5.2,1.525,-.25,4.462],
// 4 0 -.009 -.25 5.2 -.009 -.25 3.598 .859 -.25 3.588 1.525 -.25 4.462
  [4,0,-.009,-.25,5.2,-.009,-.25,3.598,.859,-.25,3.588,1.525,-.25,4.462],
// 4 0 .859 -.25 3.588 -.009 -.25 3.598 -.477 -.25 2.995 .641 -.25 2.423
  [4,0,.859,-.25,3.588,-.009,-.25,3.598,-.477,-.25,2.995,.641,-.25,2.423],
// 4 0 .703 -.25 1.768 .641 -.25 2.423 -.477 -.25 2.995 -1.569 -.25 1.591
  [4,0,.703,-.25,1.768,.641,-.25,2.423,-.477,-.25,2.995,-1.569,-.25,1.591],
// 3 0 .703 -.25 1.768 -1.569 -.25 1.591 .922 -.25 1.227
  [3,0,.703,-.25,1.768,-1.569,-.25,1.591,.922,-.25,1.227],
// 3 0 .922 -.25 1.227 -1.569 -.25 1.591 1.286 -.25 .78
  [3,0,.922,-.25,1.227,-1.569,-.25,1.591,1.286,-.25,.78],
// 4 0 .714 -.25 -.593 1.171 -.25 -.042 1.286 -.25 .78 -1.569 -.25 1.591
  [4,0,.714,-.25,-.593,1.171,-.25,-.042,1.286,-.25,.78,-1.569,-.25,1.591],
// 4 0 .454 -.25 -1.248 .714 -.25 -.593 -1.569 -.25 1.591 -2.724 -.25 -.53
  [4,0,.454,-.25,-1.248,.714,-.25,-.593,-1.569,-.25,1.591,-2.724,-.25,-.53],
// 3 0 .454 -.25 -1.248 -2.724 -.25 -.53 .36 -.25 -2.049
  [3,0,.454,-.25,-1.248,-2.724,-.25,-.53,.36,-.25,-2.049],
// 4 0 -2.724 -.25 -.53 -3.472 -.25 -2.777 .599 -.25 -3.37 .36 -.25 -2.049
  [4,0,-2.724,-.25,-.53,-3.472,-.25,-2.777,.599,-.25,-3.37,.36,-.25,-2.049],
// 4 0 1.317 -.25 -4.368 .599 -.25 -3.37 -3.472 -.25 -2.777 -3.836 -.25 -5.2
  [4,0,1.317,-.25,-4.368,.599,-.25,-3.37,-3.472,-.25,-2.777,-3.836,-.25,-5.2],
// 4 0 1.317 -.25 -4.368 -3.836 -.25 -5.2 0 -.25 -10.5 2.45 -.25 -4.992
  [4,0,1.317,-.25,-4.368,-3.836,-.25,-5.2,0,-.25,-10.5,2.45,-.25,-4.992],
// 3 0 7.11 -.25 3.588 7.42455 -.25 7.42455 6.444 -.25 4.462
  [3,0,7.11,-.25,3.588,7.42455,-.25,7.42455,6.444,-.25,4.462],
// 3 0 6.444 -.25 4.462 7.42455 -.25 7.42455 5.383 -.25 5.013
  [3,0,6.444,-.25,4.462,7.42455,-.25,7.42455,5.383,-.25,5.013],
// 3 0 5.383 -.25 5.013 7.42455 -.25 7.42455 4 -.25 5.2
  [3,0,5.383,-.25,5.013,7.42455,-.25,7.42455,4,-.25,5.2],
// 3 0 4 -.25 5.2 7.42455 -.25 7.42455 2.586 -.25 5.013
  [3,0,4,-.25,5.2,7.42455,-.25,7.42455,2.586,-.25,5.013],
];
module ldraw_lib__003667d(step=0, col=false, unit=2/5, alt=false, line=0.2, solid=!$preview)
    makepoly(ldraw_lib__003667d(), step=step, col=col, unit=unit, alt=alt, line=line, solid=solid);
ldraw_lib__003667d(line=0.2);
